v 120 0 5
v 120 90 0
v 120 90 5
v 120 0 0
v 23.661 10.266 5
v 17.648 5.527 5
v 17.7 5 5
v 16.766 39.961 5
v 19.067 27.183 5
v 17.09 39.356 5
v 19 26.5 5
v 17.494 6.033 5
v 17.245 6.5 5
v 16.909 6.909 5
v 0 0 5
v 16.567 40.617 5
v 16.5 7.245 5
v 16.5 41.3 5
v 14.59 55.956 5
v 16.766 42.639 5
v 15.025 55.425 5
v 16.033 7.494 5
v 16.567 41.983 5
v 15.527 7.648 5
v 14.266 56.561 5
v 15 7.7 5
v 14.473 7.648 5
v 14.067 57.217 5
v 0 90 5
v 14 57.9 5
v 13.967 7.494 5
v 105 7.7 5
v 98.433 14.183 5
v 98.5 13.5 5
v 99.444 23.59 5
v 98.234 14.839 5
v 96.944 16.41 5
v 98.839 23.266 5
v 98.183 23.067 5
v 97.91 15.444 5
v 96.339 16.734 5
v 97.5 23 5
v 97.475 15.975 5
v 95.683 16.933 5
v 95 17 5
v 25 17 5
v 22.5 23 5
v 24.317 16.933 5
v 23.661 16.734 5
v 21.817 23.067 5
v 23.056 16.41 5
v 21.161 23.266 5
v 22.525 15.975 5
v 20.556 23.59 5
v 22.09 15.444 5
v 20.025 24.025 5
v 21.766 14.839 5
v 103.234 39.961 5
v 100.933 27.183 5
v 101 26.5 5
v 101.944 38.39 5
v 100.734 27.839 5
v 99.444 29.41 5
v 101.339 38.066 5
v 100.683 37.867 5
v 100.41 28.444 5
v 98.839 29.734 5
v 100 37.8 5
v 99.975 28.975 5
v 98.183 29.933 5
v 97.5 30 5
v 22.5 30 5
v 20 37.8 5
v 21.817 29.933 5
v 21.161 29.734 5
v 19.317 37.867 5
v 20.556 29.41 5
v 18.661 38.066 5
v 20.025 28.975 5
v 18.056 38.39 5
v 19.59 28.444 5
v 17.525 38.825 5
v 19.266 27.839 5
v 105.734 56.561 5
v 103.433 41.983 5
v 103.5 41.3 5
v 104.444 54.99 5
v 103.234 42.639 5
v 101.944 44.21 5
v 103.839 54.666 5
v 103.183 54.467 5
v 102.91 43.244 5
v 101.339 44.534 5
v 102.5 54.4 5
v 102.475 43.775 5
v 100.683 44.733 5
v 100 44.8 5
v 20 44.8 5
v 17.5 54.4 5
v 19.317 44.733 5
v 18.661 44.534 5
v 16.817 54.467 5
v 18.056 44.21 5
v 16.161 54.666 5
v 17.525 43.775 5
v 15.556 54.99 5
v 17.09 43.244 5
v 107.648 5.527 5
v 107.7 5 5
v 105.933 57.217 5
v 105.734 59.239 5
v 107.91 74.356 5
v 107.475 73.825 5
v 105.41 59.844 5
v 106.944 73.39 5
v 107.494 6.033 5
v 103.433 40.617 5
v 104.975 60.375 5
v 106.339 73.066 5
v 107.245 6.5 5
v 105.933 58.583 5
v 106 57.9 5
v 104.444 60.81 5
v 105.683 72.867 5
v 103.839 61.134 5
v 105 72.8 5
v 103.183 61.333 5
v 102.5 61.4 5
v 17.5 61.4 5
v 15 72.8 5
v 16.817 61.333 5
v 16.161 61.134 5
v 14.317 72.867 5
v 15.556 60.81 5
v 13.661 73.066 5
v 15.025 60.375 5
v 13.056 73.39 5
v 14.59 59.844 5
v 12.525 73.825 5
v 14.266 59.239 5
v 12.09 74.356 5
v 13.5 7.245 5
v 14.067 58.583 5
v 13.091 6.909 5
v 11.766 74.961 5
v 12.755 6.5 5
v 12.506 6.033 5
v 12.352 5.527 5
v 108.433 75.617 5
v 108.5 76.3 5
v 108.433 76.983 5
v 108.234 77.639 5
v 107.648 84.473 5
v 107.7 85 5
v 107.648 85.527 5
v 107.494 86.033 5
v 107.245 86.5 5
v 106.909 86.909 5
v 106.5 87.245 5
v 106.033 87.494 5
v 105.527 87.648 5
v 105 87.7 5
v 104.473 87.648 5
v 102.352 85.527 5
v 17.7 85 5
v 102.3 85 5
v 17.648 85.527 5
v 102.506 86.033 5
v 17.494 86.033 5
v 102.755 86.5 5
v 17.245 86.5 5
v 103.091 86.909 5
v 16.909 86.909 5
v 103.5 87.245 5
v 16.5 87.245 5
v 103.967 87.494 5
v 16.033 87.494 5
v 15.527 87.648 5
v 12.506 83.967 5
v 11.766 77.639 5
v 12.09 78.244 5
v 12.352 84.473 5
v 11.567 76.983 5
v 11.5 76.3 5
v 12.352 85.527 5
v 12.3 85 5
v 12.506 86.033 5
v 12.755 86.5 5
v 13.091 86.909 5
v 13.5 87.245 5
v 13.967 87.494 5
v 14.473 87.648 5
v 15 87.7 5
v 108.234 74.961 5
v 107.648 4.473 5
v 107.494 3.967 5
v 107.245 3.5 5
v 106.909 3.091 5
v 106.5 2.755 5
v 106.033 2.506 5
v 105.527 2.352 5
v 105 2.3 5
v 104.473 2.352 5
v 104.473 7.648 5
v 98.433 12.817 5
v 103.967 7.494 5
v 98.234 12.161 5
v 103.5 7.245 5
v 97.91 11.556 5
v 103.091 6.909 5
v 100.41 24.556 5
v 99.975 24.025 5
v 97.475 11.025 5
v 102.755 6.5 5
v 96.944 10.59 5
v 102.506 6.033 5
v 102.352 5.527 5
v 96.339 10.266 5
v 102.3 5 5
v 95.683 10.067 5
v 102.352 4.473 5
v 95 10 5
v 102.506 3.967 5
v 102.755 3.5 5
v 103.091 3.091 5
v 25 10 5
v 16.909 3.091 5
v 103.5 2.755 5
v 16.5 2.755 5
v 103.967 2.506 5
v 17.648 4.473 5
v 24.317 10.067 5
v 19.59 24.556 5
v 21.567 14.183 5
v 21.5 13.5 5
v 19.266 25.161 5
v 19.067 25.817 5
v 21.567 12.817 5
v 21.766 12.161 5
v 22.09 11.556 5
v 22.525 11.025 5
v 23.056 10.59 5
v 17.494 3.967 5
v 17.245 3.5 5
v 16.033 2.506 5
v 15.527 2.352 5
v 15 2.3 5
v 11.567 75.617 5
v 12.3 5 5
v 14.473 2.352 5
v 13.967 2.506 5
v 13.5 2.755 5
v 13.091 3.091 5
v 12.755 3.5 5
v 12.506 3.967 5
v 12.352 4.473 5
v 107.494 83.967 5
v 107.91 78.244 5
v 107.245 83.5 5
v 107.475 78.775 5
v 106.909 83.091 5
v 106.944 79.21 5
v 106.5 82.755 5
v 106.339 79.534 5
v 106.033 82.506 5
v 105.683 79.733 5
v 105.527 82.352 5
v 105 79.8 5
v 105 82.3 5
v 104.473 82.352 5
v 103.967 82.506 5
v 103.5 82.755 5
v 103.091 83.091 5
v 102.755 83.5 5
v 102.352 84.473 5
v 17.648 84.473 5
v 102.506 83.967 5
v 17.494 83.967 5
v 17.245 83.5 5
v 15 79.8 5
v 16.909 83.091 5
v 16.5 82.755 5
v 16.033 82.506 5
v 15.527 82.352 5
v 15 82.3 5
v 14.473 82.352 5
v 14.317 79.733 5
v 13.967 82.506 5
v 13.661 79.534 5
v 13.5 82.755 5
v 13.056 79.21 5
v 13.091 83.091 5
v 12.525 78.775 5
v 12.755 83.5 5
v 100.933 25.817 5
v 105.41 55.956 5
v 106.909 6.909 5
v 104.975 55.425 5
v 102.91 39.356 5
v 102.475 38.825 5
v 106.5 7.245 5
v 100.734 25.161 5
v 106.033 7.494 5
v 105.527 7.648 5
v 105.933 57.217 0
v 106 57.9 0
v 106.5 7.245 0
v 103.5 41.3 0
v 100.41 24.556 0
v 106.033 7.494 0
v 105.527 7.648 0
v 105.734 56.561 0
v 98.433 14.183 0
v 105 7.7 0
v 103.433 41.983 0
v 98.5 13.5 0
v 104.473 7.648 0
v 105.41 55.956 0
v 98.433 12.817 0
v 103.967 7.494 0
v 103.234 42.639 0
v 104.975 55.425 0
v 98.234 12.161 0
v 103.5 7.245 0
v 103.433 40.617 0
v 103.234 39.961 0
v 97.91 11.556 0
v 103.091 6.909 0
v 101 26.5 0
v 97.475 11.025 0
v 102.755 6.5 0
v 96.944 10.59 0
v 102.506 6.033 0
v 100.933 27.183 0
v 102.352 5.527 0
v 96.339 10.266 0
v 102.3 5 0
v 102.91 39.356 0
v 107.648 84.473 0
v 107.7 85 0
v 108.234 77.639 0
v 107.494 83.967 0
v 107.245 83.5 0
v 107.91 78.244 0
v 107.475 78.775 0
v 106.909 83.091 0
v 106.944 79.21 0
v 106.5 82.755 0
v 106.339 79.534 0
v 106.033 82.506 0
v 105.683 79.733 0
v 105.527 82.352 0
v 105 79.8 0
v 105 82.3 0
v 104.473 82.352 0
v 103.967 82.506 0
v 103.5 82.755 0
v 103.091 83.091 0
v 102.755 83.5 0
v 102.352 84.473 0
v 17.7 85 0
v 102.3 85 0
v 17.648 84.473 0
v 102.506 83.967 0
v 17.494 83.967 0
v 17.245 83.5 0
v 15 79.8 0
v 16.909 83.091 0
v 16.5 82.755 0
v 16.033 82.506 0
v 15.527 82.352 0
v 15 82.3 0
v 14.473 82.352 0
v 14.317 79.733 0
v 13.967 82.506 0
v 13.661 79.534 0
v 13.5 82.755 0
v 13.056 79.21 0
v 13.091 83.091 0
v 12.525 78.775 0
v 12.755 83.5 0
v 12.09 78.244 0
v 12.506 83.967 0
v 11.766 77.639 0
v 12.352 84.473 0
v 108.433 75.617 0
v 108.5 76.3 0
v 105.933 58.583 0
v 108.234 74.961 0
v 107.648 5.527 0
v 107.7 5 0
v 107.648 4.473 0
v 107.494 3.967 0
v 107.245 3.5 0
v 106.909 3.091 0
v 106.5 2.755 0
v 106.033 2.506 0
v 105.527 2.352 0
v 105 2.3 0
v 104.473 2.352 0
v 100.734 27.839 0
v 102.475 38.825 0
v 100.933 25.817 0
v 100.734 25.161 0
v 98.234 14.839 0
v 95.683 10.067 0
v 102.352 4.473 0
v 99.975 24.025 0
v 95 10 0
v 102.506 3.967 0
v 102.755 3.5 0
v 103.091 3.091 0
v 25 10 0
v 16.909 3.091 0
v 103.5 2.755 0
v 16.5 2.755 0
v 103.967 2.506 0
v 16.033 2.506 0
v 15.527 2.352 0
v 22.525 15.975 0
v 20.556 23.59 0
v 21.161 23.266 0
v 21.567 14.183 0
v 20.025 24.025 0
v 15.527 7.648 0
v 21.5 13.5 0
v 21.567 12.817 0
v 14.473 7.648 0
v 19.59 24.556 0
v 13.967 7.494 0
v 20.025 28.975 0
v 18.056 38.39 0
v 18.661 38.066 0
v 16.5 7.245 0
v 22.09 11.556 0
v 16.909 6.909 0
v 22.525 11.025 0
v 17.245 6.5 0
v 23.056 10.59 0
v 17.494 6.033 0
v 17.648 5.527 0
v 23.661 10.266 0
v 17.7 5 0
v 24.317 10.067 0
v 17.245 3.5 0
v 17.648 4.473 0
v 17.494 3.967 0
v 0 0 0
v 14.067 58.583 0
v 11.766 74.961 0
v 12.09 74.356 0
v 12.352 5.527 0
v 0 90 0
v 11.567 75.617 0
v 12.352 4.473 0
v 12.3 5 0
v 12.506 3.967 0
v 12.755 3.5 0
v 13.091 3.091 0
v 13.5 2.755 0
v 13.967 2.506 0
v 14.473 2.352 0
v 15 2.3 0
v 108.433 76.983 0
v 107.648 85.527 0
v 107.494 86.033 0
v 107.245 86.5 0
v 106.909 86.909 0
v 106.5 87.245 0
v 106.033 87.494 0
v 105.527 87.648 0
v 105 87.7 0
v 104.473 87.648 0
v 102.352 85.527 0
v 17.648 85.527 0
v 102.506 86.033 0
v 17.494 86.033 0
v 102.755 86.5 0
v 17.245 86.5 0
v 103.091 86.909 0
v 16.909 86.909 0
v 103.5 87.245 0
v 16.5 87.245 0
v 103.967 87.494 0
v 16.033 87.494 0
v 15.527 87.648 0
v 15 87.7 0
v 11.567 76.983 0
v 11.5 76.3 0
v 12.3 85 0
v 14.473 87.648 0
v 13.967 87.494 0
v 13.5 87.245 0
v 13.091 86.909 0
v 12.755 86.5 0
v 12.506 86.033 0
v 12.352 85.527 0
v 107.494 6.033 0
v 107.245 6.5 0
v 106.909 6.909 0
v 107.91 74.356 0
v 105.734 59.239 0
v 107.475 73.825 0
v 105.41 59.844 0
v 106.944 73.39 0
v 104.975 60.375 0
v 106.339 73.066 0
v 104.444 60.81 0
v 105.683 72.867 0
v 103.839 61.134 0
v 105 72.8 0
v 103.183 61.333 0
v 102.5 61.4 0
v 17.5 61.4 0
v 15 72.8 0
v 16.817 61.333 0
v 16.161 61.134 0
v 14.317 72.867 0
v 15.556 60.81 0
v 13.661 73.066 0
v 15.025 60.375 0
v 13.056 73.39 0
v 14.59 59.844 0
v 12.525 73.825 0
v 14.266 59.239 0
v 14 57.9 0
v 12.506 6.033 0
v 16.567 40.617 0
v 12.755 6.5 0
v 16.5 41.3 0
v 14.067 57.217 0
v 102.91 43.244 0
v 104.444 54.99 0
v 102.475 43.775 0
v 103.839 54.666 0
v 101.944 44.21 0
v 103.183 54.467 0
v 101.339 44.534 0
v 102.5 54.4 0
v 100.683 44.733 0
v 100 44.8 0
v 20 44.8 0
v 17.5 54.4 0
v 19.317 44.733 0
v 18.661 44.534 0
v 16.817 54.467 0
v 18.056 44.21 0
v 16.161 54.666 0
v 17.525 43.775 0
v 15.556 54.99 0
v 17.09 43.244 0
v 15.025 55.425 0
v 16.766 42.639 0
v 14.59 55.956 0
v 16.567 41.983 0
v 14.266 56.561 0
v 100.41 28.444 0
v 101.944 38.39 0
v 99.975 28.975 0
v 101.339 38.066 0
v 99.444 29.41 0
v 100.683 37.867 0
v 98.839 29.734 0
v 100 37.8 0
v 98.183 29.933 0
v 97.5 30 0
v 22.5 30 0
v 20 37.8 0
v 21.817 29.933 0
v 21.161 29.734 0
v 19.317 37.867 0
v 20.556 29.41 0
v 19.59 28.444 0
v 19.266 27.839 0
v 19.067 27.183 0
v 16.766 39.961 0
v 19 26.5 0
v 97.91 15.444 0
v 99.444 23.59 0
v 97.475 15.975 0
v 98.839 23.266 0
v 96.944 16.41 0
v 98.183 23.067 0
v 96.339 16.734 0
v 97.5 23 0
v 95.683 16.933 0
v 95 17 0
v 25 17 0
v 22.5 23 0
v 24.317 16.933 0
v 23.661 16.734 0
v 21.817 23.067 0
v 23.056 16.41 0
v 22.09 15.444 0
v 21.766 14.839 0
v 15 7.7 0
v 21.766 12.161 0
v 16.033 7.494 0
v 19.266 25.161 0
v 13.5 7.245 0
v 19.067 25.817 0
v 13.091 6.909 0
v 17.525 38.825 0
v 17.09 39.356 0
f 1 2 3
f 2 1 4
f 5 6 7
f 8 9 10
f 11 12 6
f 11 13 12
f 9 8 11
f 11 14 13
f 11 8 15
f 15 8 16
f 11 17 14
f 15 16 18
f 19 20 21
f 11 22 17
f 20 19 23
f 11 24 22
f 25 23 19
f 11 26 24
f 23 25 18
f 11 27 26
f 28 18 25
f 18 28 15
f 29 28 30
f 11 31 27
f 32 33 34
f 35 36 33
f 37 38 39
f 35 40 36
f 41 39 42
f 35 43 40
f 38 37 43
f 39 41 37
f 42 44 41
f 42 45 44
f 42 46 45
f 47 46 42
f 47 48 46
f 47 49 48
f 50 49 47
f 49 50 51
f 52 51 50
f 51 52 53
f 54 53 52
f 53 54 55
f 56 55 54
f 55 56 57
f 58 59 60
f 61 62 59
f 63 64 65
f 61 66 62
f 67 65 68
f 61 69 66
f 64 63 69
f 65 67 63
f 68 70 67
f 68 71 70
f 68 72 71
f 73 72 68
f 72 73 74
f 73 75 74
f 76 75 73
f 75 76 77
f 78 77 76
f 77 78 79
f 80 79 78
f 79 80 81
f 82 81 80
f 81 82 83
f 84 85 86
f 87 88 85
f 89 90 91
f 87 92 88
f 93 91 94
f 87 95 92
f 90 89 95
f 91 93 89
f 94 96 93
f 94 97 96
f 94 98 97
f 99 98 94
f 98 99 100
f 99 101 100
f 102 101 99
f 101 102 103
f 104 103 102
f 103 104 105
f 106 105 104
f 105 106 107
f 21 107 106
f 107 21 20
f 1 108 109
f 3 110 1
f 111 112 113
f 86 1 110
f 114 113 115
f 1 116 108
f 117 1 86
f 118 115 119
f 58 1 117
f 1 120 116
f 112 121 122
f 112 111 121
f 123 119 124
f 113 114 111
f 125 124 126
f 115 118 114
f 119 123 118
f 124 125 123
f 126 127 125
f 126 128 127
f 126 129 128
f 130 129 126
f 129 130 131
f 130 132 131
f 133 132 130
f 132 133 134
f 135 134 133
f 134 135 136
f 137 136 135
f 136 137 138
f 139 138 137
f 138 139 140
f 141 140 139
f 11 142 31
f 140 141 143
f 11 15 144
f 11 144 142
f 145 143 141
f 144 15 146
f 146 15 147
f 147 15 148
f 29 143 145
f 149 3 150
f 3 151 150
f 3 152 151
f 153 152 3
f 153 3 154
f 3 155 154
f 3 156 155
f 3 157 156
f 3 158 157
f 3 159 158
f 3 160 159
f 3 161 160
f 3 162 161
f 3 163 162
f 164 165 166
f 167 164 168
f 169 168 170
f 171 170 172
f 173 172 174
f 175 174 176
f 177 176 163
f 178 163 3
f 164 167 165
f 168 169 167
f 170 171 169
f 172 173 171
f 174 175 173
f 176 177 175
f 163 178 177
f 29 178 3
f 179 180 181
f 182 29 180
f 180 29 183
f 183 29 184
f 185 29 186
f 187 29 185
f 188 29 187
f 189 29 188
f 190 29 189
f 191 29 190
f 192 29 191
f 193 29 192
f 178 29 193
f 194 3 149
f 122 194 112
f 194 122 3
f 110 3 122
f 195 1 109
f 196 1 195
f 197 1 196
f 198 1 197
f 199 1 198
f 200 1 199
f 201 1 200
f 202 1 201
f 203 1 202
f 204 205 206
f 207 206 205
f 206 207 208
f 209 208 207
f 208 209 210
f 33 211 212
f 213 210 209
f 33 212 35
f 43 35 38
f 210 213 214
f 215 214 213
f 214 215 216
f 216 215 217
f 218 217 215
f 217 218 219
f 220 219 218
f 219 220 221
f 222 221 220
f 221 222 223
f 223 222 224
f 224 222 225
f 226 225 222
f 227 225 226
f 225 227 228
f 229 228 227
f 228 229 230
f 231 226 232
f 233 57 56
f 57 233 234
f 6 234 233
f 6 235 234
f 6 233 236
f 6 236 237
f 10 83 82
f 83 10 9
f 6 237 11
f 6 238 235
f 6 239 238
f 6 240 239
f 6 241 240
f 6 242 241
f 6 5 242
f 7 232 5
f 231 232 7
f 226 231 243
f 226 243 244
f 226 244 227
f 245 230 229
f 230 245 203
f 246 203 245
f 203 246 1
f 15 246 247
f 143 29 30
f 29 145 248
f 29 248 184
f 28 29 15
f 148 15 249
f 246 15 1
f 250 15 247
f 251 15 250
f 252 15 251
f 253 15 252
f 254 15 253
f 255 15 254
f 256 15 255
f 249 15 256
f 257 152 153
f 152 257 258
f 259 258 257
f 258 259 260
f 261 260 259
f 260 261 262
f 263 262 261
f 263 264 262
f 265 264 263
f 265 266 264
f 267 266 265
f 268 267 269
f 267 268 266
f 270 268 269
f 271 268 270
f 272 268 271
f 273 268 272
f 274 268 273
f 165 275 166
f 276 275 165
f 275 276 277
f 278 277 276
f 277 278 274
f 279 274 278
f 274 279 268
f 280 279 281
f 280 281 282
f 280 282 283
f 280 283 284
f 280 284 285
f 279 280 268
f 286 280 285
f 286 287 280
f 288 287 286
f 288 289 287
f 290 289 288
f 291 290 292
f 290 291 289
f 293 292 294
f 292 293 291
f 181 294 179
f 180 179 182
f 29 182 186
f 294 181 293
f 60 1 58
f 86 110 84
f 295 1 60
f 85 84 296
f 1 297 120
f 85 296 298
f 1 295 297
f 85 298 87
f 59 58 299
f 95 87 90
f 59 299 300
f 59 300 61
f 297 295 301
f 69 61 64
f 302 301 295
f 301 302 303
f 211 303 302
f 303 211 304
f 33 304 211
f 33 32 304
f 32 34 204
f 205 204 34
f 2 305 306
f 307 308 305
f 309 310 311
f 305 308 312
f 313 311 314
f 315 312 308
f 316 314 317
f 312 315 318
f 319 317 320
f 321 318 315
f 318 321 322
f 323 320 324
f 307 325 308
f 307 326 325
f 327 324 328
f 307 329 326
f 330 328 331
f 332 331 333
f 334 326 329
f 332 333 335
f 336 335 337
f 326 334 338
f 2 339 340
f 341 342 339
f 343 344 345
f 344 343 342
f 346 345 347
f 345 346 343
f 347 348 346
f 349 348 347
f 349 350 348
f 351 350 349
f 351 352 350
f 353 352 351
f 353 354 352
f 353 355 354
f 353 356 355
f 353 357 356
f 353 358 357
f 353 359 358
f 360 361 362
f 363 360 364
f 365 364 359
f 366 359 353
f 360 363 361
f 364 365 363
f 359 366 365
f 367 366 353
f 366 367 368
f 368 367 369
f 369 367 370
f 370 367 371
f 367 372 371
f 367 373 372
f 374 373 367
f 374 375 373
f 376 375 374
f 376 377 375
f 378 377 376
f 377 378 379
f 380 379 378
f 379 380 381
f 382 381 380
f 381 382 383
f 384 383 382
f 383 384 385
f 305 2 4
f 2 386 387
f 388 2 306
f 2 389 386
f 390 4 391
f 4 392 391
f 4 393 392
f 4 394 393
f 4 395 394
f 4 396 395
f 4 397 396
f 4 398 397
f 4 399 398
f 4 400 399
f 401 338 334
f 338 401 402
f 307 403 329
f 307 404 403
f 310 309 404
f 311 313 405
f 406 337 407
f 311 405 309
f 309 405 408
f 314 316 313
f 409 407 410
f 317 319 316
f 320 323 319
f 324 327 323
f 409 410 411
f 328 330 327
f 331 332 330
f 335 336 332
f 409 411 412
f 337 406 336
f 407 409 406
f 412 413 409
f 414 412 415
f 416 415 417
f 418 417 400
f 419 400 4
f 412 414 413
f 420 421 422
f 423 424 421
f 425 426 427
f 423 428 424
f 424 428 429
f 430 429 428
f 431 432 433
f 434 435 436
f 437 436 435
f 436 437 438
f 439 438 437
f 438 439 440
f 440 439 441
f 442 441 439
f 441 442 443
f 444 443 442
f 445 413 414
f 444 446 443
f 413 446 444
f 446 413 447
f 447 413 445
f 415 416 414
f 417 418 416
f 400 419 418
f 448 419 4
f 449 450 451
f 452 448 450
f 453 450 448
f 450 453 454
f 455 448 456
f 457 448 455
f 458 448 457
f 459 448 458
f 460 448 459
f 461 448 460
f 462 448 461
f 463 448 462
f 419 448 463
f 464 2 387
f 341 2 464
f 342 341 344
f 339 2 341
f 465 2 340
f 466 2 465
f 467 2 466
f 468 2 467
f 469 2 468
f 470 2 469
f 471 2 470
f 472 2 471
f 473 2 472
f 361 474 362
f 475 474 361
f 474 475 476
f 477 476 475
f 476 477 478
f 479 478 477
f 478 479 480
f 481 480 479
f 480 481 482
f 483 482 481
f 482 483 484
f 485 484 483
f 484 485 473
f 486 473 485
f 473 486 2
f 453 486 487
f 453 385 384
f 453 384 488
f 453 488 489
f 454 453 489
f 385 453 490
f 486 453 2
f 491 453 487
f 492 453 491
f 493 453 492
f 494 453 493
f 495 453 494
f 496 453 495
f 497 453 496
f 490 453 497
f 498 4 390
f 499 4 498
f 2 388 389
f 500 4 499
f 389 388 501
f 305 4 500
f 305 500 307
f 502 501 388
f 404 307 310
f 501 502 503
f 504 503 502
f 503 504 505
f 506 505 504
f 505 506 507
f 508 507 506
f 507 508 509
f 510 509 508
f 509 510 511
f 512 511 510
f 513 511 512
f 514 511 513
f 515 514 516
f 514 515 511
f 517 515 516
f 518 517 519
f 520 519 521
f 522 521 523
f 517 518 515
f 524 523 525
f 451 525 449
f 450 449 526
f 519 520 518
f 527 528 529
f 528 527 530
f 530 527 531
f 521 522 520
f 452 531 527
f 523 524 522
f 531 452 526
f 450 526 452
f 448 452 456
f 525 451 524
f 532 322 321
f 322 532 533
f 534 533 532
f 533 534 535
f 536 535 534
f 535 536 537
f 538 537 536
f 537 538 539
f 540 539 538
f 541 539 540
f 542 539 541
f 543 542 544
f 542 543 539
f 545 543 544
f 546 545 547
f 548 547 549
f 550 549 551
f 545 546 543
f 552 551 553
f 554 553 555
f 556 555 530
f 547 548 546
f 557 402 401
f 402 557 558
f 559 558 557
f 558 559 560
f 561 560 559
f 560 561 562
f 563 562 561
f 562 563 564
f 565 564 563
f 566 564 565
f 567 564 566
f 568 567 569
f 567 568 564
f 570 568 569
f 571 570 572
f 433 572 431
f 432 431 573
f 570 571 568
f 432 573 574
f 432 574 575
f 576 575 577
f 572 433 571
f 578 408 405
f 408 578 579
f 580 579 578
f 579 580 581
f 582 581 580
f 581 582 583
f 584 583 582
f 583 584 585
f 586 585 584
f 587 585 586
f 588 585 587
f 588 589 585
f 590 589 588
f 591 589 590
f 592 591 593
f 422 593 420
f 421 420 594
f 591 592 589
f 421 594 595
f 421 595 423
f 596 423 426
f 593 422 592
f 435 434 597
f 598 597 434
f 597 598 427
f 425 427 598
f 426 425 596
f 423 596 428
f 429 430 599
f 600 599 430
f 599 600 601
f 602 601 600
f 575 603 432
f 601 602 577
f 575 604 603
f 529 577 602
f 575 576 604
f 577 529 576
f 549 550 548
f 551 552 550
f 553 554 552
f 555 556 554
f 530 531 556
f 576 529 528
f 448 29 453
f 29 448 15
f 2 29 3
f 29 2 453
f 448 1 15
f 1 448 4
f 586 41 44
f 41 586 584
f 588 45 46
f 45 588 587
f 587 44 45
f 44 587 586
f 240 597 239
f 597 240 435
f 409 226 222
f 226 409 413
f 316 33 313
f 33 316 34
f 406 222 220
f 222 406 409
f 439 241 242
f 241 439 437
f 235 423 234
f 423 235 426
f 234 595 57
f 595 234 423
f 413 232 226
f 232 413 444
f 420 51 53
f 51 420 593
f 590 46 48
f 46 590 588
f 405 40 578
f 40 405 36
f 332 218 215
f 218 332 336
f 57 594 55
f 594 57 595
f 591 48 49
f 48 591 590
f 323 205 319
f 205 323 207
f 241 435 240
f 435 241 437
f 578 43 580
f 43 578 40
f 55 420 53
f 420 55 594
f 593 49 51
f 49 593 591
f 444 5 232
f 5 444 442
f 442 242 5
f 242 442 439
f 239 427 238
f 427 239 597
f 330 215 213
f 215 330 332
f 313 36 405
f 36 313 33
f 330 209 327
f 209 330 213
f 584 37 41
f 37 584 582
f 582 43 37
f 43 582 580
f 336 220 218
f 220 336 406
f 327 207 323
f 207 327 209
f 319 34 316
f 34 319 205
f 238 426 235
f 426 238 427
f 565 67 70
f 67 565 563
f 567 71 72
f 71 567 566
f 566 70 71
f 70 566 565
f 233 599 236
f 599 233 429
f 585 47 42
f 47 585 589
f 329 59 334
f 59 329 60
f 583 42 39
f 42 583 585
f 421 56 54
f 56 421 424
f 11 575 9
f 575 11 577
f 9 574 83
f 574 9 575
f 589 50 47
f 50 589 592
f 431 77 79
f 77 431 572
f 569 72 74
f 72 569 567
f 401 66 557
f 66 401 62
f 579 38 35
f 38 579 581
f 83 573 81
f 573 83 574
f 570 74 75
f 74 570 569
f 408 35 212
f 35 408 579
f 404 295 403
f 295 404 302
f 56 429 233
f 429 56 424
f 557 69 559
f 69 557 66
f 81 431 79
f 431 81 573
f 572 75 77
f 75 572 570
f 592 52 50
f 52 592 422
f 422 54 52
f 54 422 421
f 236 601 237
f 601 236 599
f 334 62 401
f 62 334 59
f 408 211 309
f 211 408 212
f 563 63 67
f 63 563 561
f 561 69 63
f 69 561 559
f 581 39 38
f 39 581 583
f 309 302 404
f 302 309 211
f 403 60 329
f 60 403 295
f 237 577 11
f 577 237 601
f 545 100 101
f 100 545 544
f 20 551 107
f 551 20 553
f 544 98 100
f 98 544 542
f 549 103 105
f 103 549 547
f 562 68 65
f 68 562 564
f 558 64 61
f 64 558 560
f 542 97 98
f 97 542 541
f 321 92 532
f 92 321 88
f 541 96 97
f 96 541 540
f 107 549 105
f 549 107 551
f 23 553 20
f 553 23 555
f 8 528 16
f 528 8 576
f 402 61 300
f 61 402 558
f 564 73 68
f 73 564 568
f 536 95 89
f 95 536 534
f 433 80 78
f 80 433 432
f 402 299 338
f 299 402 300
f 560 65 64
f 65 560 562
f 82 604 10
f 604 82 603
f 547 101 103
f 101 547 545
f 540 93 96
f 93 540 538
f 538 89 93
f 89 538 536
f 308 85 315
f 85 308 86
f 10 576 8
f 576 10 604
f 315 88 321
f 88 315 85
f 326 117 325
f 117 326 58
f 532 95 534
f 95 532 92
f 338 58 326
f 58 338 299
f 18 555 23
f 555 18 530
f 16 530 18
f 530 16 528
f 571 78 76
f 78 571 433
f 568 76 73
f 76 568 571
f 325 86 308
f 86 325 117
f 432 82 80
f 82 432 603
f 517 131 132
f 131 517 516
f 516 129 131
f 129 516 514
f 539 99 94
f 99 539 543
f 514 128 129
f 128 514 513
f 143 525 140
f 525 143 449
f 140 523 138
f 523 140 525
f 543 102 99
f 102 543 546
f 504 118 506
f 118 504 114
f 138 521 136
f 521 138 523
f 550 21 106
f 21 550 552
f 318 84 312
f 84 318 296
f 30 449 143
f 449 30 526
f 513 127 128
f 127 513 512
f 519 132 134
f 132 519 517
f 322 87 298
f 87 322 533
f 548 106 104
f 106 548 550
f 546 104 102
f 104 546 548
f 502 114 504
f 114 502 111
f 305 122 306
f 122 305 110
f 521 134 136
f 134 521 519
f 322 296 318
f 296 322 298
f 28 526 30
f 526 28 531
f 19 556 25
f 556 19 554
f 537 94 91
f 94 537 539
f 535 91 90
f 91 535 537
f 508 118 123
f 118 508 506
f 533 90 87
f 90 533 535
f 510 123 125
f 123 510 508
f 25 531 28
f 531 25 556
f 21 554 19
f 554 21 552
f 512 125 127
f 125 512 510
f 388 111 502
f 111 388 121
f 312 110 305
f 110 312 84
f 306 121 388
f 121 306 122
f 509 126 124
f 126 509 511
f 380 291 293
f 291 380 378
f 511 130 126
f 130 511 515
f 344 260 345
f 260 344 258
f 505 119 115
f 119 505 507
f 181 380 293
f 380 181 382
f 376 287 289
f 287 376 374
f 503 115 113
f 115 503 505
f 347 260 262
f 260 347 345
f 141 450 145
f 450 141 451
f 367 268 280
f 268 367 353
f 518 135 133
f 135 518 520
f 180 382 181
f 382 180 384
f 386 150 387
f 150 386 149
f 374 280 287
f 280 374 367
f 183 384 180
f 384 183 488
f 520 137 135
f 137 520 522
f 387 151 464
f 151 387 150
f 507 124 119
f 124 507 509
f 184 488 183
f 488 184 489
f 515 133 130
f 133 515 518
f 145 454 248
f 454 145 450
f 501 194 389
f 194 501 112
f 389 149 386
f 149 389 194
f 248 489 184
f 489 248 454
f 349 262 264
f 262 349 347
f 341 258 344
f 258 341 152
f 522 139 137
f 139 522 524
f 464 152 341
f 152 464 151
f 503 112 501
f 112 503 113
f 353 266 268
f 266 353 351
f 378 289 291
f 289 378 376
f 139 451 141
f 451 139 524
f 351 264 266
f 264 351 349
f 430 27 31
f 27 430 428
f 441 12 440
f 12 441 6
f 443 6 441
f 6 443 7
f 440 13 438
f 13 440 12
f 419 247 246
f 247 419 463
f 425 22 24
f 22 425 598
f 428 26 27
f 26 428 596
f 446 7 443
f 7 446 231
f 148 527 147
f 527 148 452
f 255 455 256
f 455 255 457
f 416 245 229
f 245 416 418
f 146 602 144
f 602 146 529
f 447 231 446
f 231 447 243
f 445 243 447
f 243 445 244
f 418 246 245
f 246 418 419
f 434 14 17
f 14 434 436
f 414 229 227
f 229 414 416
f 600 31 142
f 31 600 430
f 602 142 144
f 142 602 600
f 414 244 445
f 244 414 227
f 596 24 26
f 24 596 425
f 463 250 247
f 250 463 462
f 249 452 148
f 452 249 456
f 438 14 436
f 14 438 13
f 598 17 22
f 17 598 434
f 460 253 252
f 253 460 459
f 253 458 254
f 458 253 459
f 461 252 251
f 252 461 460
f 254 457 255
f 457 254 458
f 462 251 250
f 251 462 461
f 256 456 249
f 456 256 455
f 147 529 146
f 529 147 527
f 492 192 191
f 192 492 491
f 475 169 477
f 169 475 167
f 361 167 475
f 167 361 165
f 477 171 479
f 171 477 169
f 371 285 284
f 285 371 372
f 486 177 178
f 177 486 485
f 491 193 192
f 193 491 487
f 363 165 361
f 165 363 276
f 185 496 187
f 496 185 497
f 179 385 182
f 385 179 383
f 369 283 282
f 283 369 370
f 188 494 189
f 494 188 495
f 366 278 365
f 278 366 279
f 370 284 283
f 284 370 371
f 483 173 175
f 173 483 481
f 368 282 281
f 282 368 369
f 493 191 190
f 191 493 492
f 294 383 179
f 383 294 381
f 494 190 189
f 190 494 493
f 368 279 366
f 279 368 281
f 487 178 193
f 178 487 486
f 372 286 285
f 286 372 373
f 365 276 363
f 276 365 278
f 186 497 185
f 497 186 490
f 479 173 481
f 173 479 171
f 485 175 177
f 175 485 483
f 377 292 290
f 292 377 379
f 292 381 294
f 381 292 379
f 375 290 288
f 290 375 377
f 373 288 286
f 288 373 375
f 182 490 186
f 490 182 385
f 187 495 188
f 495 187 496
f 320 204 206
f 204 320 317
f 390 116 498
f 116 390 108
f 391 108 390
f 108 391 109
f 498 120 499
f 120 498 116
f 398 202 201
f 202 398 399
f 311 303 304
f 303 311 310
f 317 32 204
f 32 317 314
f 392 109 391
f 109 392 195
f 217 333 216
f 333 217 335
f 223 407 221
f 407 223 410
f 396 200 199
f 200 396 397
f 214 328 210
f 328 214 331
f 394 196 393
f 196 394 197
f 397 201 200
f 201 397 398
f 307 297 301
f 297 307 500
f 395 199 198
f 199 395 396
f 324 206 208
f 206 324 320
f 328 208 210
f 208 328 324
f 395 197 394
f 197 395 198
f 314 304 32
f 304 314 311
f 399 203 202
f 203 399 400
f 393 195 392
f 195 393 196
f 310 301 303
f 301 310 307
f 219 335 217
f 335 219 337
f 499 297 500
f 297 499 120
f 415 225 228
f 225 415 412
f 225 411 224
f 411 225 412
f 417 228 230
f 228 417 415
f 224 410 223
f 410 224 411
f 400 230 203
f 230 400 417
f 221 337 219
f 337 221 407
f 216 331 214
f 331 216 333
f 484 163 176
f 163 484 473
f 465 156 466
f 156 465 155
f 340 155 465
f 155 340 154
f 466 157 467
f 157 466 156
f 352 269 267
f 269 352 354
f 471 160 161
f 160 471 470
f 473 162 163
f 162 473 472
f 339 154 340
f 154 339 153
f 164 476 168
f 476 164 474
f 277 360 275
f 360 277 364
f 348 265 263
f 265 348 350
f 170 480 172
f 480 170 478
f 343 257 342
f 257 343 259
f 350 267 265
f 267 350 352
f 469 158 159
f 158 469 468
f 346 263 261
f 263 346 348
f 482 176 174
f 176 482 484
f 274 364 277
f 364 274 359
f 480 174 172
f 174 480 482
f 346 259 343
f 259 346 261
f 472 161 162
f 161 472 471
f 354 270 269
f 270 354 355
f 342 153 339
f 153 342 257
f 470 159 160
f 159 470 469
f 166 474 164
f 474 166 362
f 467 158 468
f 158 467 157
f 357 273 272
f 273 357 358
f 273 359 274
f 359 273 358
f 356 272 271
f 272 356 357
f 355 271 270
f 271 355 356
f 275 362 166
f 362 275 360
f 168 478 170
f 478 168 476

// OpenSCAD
$fn = 32;

// ----------------------------------------------------------------------
// Slotted panel: 120 x 90 mm, 5 рядов of slots
// ----------------------------------------------------------------------

// --- parameters (mm) ---
panel_w = 120;            // panel width
panel_d = 90;             // panel depth
thick = 5;                // panel thickness
slot_w = 7;               // slot width
pitch0 = 13;              // first row pitch
pitch_step = 1.8;         // pitch increase per row
margin = 10;              // margin around the slot field
rows = 5;                 // number of slot rows
mount_d = 5.4;            // mounting holes
mount_x = 45;             // mounting hole offset

difference() {
  union() {
    cube([panel_w, panel_d, thick]);
  }
  /* slot rows: stadium shaped cutters, 2.5 mm clear of both faces */
  /* row 0: pitch 13, length 70 */
  hull() {
    translate([25, 13.5, -2.5]) cylinder(h = thick + 5, d = slot_w);
    translate([95, 13.5, -2.5]) cylinder(h = thick + 5, d = slot_w);
  }
  /* row 1: pitch 14.8, length 75 */
  hull() {
    translate([22.5, 26.5, -2.5]) cylinder(h = thick + 5, d = slot_w);
    translate([97.5, 26.5, -2.5]) cylinder(h = thick + 5, d = slot_w);
  }
  /* row 2: pitch 16.6, length 80 */
  hull() {
    translate([20, 41.3, -2.5]) cylinder(h = thick + 5, d = slot_w);
    translate([100, 41.3, -2.5]) cylinder(h = thick + 5, d = slot_w);
  }
  /* row 3: pitch 18.4, length 85 */
  hull() {
    translate([17.5, 57.9, -2.5]) cylinder(h = thick + 5, d = slot_w);
    translate([102.5, 57.9, -2.5]) cylinder(h = thick + 5, d = slot_w);
  }
  /* row 4: pitch 20.2, length 90 */
  hull() {
    translate([15, 76.3, -2.5]) cylinder(h = thick + 5, d = slot_w);
    translate([105, 76.3, -2.5]) cylinder(h = thick + 5, d = slot_w);
  }
  translate([15, 5, -2.5]) cylinder(h = 10, d = mount_d);
  translate([15, 85, -2.5]) cylinder(h = 10, d = mount_d);
  translate([105, 5, -2.5]) cylinder(h = 10, d = mount_d);
  translate([105, 85, -2.5]) cylinder(h = 10, d = mount_d);
}
